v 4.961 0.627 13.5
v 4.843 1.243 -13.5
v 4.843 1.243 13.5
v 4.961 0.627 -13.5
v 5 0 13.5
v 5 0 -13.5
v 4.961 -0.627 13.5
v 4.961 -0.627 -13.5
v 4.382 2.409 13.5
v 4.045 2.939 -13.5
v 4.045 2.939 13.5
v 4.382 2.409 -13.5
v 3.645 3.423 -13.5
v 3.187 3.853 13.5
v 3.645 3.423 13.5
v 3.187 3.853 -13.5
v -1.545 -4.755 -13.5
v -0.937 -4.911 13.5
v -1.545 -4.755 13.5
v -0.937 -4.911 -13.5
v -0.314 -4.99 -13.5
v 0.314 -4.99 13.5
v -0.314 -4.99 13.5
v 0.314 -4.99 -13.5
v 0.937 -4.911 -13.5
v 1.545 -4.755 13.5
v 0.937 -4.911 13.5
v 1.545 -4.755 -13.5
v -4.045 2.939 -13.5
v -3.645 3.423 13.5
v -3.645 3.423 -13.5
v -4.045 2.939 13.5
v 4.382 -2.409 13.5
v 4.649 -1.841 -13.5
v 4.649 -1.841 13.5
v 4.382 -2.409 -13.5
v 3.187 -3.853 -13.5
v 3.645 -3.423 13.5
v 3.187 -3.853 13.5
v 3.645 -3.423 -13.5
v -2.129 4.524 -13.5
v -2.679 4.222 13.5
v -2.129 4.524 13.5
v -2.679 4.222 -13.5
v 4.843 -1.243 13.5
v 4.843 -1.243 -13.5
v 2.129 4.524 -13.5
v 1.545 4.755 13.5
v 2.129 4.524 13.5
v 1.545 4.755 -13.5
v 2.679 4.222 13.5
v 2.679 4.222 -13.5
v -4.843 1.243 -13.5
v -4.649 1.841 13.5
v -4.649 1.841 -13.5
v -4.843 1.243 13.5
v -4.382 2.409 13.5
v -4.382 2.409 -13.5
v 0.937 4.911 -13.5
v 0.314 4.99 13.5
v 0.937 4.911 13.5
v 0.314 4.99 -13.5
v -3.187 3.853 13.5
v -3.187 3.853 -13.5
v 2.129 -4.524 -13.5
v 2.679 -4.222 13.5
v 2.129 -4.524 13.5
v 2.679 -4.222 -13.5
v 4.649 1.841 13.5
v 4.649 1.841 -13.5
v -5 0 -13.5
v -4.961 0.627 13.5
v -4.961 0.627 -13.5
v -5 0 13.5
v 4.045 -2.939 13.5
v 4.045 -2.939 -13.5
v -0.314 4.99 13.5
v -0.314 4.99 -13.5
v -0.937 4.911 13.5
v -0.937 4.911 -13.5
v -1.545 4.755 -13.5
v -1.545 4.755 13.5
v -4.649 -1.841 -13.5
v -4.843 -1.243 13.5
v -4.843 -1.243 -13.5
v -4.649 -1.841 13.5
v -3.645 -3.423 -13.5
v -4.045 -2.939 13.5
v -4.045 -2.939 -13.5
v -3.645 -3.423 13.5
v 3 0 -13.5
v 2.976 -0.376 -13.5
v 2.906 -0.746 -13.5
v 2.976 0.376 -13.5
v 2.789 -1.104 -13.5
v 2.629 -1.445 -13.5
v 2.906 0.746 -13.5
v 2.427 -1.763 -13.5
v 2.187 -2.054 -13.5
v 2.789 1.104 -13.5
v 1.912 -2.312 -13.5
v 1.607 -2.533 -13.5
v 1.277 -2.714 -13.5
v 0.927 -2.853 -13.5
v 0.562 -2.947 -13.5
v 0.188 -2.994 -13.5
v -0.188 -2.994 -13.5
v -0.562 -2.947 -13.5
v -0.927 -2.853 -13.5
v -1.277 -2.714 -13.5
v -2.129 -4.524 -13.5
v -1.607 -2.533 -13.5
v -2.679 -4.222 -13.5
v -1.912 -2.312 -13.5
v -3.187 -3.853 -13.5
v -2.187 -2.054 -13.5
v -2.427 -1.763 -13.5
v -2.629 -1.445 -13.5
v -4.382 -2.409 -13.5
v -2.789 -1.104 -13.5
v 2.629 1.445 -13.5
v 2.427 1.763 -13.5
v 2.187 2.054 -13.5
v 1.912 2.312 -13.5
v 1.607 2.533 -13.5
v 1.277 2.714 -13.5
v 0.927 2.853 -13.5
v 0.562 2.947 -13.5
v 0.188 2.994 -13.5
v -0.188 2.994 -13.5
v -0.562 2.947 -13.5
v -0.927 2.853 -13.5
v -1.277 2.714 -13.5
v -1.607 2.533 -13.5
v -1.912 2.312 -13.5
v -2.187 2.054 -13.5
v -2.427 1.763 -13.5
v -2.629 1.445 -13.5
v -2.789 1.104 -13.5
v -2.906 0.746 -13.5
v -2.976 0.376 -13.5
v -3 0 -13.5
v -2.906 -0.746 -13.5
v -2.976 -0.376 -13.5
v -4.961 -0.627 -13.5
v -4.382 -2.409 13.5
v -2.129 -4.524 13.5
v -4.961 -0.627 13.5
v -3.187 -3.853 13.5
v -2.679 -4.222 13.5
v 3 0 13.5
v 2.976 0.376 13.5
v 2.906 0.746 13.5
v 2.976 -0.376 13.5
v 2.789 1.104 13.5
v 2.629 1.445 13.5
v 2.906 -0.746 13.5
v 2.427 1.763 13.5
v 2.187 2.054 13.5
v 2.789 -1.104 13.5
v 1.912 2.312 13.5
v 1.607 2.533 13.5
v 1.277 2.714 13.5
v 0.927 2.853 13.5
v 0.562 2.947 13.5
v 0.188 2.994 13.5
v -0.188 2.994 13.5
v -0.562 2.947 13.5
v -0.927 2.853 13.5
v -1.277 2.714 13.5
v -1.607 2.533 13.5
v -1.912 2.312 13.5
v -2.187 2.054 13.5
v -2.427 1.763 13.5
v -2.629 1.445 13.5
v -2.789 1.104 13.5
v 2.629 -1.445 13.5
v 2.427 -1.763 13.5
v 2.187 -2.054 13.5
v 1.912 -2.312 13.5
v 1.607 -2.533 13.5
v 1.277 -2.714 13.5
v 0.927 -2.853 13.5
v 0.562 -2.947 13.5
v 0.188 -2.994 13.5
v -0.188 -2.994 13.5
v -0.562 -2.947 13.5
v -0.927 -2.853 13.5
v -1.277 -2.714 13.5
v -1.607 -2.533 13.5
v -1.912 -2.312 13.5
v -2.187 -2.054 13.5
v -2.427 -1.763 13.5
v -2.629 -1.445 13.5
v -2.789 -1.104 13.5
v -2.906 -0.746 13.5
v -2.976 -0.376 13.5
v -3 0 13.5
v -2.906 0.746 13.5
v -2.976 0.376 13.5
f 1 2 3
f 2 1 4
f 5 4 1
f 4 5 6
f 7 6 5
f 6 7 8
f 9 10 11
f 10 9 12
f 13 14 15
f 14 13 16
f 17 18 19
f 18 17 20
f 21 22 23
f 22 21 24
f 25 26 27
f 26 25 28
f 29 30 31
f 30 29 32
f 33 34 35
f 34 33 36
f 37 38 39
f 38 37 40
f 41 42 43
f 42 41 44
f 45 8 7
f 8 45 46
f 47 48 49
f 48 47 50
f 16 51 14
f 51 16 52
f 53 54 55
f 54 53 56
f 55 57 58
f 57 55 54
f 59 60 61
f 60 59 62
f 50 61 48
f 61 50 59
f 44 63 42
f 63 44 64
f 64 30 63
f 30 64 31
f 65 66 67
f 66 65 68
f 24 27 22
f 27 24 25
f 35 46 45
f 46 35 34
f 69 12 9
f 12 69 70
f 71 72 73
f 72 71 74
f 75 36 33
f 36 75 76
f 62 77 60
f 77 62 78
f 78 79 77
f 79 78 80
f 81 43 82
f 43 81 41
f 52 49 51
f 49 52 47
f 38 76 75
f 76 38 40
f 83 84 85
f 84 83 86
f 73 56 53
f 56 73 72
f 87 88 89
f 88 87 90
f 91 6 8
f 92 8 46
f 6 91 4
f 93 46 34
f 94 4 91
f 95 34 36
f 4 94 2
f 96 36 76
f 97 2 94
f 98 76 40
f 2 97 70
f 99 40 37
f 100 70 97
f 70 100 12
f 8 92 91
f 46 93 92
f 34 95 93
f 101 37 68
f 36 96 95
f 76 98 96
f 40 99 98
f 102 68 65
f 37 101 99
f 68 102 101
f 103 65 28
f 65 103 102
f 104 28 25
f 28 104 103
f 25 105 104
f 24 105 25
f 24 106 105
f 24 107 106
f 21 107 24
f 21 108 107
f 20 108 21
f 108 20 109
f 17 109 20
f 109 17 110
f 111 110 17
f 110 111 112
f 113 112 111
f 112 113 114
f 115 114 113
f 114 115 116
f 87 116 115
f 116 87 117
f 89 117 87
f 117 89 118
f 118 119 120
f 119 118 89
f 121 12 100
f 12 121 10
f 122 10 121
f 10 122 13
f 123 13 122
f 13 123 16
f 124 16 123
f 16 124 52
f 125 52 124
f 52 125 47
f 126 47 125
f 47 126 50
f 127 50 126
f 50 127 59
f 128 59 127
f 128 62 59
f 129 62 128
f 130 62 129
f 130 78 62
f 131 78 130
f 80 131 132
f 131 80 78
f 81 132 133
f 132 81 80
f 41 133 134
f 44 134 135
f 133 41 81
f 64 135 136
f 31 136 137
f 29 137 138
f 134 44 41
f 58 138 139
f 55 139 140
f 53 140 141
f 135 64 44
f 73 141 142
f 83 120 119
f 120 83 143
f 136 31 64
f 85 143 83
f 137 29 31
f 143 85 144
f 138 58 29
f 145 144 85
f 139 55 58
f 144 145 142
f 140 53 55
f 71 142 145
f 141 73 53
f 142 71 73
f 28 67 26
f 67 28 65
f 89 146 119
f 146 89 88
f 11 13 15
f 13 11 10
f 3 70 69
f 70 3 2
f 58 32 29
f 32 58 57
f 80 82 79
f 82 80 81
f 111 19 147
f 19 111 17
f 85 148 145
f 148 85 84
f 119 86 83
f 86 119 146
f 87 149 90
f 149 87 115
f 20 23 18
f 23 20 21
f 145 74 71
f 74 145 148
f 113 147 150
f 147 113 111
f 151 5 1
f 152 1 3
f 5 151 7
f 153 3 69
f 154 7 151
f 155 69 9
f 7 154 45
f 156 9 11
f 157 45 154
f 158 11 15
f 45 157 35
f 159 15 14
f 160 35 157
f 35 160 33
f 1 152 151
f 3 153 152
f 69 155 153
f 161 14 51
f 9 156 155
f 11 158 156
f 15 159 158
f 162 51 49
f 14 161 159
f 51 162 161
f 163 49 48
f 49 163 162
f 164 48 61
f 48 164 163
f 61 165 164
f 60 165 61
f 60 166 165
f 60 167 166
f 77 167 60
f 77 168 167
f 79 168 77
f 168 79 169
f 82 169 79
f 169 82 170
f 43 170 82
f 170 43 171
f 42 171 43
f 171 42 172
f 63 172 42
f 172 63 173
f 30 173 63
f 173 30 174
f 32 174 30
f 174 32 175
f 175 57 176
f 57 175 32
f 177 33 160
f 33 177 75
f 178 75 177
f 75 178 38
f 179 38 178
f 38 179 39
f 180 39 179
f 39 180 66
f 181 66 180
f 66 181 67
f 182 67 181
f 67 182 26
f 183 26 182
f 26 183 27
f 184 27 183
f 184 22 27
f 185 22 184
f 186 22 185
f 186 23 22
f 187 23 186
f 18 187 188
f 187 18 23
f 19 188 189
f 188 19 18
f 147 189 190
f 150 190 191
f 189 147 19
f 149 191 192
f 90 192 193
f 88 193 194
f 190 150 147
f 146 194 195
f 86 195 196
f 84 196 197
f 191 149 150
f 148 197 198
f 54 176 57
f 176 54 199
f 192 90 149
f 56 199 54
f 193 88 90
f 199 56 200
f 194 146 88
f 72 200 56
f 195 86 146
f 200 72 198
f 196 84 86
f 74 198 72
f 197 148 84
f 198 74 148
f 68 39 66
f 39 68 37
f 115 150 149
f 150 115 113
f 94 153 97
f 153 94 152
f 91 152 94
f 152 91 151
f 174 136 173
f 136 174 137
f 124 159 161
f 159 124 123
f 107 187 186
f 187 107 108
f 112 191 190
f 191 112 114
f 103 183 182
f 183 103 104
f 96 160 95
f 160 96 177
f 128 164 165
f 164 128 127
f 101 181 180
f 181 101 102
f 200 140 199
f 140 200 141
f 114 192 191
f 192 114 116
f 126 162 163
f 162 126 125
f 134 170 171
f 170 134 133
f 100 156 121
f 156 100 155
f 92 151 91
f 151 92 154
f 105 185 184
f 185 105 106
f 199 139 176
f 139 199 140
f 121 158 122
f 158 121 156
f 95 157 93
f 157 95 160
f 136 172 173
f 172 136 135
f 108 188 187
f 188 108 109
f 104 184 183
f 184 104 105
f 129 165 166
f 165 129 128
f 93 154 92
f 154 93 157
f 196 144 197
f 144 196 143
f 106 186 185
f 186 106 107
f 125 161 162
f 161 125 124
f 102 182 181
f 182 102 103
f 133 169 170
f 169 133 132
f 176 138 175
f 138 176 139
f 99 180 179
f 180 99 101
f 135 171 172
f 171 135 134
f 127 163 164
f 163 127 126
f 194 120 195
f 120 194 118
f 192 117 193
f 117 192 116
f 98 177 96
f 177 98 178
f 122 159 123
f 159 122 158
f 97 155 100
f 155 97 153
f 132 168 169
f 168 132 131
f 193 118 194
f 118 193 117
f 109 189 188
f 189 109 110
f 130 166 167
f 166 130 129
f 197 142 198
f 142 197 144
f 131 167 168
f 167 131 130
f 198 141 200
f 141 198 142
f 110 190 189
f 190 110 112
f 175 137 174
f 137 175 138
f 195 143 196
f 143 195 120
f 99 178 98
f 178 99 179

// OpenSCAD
$fn = 50;


difference() {
	union() {
		translate(v = [0, 0, -13.5000000000]) {
			cylinder(h = 27, r = 5.0000000000);
		}
	}
	union() {
		translate(v = [0, 0, -100.0000000000]) {
			cylinder(h = 200, r = 3.0000000000);
		}
	}
}
